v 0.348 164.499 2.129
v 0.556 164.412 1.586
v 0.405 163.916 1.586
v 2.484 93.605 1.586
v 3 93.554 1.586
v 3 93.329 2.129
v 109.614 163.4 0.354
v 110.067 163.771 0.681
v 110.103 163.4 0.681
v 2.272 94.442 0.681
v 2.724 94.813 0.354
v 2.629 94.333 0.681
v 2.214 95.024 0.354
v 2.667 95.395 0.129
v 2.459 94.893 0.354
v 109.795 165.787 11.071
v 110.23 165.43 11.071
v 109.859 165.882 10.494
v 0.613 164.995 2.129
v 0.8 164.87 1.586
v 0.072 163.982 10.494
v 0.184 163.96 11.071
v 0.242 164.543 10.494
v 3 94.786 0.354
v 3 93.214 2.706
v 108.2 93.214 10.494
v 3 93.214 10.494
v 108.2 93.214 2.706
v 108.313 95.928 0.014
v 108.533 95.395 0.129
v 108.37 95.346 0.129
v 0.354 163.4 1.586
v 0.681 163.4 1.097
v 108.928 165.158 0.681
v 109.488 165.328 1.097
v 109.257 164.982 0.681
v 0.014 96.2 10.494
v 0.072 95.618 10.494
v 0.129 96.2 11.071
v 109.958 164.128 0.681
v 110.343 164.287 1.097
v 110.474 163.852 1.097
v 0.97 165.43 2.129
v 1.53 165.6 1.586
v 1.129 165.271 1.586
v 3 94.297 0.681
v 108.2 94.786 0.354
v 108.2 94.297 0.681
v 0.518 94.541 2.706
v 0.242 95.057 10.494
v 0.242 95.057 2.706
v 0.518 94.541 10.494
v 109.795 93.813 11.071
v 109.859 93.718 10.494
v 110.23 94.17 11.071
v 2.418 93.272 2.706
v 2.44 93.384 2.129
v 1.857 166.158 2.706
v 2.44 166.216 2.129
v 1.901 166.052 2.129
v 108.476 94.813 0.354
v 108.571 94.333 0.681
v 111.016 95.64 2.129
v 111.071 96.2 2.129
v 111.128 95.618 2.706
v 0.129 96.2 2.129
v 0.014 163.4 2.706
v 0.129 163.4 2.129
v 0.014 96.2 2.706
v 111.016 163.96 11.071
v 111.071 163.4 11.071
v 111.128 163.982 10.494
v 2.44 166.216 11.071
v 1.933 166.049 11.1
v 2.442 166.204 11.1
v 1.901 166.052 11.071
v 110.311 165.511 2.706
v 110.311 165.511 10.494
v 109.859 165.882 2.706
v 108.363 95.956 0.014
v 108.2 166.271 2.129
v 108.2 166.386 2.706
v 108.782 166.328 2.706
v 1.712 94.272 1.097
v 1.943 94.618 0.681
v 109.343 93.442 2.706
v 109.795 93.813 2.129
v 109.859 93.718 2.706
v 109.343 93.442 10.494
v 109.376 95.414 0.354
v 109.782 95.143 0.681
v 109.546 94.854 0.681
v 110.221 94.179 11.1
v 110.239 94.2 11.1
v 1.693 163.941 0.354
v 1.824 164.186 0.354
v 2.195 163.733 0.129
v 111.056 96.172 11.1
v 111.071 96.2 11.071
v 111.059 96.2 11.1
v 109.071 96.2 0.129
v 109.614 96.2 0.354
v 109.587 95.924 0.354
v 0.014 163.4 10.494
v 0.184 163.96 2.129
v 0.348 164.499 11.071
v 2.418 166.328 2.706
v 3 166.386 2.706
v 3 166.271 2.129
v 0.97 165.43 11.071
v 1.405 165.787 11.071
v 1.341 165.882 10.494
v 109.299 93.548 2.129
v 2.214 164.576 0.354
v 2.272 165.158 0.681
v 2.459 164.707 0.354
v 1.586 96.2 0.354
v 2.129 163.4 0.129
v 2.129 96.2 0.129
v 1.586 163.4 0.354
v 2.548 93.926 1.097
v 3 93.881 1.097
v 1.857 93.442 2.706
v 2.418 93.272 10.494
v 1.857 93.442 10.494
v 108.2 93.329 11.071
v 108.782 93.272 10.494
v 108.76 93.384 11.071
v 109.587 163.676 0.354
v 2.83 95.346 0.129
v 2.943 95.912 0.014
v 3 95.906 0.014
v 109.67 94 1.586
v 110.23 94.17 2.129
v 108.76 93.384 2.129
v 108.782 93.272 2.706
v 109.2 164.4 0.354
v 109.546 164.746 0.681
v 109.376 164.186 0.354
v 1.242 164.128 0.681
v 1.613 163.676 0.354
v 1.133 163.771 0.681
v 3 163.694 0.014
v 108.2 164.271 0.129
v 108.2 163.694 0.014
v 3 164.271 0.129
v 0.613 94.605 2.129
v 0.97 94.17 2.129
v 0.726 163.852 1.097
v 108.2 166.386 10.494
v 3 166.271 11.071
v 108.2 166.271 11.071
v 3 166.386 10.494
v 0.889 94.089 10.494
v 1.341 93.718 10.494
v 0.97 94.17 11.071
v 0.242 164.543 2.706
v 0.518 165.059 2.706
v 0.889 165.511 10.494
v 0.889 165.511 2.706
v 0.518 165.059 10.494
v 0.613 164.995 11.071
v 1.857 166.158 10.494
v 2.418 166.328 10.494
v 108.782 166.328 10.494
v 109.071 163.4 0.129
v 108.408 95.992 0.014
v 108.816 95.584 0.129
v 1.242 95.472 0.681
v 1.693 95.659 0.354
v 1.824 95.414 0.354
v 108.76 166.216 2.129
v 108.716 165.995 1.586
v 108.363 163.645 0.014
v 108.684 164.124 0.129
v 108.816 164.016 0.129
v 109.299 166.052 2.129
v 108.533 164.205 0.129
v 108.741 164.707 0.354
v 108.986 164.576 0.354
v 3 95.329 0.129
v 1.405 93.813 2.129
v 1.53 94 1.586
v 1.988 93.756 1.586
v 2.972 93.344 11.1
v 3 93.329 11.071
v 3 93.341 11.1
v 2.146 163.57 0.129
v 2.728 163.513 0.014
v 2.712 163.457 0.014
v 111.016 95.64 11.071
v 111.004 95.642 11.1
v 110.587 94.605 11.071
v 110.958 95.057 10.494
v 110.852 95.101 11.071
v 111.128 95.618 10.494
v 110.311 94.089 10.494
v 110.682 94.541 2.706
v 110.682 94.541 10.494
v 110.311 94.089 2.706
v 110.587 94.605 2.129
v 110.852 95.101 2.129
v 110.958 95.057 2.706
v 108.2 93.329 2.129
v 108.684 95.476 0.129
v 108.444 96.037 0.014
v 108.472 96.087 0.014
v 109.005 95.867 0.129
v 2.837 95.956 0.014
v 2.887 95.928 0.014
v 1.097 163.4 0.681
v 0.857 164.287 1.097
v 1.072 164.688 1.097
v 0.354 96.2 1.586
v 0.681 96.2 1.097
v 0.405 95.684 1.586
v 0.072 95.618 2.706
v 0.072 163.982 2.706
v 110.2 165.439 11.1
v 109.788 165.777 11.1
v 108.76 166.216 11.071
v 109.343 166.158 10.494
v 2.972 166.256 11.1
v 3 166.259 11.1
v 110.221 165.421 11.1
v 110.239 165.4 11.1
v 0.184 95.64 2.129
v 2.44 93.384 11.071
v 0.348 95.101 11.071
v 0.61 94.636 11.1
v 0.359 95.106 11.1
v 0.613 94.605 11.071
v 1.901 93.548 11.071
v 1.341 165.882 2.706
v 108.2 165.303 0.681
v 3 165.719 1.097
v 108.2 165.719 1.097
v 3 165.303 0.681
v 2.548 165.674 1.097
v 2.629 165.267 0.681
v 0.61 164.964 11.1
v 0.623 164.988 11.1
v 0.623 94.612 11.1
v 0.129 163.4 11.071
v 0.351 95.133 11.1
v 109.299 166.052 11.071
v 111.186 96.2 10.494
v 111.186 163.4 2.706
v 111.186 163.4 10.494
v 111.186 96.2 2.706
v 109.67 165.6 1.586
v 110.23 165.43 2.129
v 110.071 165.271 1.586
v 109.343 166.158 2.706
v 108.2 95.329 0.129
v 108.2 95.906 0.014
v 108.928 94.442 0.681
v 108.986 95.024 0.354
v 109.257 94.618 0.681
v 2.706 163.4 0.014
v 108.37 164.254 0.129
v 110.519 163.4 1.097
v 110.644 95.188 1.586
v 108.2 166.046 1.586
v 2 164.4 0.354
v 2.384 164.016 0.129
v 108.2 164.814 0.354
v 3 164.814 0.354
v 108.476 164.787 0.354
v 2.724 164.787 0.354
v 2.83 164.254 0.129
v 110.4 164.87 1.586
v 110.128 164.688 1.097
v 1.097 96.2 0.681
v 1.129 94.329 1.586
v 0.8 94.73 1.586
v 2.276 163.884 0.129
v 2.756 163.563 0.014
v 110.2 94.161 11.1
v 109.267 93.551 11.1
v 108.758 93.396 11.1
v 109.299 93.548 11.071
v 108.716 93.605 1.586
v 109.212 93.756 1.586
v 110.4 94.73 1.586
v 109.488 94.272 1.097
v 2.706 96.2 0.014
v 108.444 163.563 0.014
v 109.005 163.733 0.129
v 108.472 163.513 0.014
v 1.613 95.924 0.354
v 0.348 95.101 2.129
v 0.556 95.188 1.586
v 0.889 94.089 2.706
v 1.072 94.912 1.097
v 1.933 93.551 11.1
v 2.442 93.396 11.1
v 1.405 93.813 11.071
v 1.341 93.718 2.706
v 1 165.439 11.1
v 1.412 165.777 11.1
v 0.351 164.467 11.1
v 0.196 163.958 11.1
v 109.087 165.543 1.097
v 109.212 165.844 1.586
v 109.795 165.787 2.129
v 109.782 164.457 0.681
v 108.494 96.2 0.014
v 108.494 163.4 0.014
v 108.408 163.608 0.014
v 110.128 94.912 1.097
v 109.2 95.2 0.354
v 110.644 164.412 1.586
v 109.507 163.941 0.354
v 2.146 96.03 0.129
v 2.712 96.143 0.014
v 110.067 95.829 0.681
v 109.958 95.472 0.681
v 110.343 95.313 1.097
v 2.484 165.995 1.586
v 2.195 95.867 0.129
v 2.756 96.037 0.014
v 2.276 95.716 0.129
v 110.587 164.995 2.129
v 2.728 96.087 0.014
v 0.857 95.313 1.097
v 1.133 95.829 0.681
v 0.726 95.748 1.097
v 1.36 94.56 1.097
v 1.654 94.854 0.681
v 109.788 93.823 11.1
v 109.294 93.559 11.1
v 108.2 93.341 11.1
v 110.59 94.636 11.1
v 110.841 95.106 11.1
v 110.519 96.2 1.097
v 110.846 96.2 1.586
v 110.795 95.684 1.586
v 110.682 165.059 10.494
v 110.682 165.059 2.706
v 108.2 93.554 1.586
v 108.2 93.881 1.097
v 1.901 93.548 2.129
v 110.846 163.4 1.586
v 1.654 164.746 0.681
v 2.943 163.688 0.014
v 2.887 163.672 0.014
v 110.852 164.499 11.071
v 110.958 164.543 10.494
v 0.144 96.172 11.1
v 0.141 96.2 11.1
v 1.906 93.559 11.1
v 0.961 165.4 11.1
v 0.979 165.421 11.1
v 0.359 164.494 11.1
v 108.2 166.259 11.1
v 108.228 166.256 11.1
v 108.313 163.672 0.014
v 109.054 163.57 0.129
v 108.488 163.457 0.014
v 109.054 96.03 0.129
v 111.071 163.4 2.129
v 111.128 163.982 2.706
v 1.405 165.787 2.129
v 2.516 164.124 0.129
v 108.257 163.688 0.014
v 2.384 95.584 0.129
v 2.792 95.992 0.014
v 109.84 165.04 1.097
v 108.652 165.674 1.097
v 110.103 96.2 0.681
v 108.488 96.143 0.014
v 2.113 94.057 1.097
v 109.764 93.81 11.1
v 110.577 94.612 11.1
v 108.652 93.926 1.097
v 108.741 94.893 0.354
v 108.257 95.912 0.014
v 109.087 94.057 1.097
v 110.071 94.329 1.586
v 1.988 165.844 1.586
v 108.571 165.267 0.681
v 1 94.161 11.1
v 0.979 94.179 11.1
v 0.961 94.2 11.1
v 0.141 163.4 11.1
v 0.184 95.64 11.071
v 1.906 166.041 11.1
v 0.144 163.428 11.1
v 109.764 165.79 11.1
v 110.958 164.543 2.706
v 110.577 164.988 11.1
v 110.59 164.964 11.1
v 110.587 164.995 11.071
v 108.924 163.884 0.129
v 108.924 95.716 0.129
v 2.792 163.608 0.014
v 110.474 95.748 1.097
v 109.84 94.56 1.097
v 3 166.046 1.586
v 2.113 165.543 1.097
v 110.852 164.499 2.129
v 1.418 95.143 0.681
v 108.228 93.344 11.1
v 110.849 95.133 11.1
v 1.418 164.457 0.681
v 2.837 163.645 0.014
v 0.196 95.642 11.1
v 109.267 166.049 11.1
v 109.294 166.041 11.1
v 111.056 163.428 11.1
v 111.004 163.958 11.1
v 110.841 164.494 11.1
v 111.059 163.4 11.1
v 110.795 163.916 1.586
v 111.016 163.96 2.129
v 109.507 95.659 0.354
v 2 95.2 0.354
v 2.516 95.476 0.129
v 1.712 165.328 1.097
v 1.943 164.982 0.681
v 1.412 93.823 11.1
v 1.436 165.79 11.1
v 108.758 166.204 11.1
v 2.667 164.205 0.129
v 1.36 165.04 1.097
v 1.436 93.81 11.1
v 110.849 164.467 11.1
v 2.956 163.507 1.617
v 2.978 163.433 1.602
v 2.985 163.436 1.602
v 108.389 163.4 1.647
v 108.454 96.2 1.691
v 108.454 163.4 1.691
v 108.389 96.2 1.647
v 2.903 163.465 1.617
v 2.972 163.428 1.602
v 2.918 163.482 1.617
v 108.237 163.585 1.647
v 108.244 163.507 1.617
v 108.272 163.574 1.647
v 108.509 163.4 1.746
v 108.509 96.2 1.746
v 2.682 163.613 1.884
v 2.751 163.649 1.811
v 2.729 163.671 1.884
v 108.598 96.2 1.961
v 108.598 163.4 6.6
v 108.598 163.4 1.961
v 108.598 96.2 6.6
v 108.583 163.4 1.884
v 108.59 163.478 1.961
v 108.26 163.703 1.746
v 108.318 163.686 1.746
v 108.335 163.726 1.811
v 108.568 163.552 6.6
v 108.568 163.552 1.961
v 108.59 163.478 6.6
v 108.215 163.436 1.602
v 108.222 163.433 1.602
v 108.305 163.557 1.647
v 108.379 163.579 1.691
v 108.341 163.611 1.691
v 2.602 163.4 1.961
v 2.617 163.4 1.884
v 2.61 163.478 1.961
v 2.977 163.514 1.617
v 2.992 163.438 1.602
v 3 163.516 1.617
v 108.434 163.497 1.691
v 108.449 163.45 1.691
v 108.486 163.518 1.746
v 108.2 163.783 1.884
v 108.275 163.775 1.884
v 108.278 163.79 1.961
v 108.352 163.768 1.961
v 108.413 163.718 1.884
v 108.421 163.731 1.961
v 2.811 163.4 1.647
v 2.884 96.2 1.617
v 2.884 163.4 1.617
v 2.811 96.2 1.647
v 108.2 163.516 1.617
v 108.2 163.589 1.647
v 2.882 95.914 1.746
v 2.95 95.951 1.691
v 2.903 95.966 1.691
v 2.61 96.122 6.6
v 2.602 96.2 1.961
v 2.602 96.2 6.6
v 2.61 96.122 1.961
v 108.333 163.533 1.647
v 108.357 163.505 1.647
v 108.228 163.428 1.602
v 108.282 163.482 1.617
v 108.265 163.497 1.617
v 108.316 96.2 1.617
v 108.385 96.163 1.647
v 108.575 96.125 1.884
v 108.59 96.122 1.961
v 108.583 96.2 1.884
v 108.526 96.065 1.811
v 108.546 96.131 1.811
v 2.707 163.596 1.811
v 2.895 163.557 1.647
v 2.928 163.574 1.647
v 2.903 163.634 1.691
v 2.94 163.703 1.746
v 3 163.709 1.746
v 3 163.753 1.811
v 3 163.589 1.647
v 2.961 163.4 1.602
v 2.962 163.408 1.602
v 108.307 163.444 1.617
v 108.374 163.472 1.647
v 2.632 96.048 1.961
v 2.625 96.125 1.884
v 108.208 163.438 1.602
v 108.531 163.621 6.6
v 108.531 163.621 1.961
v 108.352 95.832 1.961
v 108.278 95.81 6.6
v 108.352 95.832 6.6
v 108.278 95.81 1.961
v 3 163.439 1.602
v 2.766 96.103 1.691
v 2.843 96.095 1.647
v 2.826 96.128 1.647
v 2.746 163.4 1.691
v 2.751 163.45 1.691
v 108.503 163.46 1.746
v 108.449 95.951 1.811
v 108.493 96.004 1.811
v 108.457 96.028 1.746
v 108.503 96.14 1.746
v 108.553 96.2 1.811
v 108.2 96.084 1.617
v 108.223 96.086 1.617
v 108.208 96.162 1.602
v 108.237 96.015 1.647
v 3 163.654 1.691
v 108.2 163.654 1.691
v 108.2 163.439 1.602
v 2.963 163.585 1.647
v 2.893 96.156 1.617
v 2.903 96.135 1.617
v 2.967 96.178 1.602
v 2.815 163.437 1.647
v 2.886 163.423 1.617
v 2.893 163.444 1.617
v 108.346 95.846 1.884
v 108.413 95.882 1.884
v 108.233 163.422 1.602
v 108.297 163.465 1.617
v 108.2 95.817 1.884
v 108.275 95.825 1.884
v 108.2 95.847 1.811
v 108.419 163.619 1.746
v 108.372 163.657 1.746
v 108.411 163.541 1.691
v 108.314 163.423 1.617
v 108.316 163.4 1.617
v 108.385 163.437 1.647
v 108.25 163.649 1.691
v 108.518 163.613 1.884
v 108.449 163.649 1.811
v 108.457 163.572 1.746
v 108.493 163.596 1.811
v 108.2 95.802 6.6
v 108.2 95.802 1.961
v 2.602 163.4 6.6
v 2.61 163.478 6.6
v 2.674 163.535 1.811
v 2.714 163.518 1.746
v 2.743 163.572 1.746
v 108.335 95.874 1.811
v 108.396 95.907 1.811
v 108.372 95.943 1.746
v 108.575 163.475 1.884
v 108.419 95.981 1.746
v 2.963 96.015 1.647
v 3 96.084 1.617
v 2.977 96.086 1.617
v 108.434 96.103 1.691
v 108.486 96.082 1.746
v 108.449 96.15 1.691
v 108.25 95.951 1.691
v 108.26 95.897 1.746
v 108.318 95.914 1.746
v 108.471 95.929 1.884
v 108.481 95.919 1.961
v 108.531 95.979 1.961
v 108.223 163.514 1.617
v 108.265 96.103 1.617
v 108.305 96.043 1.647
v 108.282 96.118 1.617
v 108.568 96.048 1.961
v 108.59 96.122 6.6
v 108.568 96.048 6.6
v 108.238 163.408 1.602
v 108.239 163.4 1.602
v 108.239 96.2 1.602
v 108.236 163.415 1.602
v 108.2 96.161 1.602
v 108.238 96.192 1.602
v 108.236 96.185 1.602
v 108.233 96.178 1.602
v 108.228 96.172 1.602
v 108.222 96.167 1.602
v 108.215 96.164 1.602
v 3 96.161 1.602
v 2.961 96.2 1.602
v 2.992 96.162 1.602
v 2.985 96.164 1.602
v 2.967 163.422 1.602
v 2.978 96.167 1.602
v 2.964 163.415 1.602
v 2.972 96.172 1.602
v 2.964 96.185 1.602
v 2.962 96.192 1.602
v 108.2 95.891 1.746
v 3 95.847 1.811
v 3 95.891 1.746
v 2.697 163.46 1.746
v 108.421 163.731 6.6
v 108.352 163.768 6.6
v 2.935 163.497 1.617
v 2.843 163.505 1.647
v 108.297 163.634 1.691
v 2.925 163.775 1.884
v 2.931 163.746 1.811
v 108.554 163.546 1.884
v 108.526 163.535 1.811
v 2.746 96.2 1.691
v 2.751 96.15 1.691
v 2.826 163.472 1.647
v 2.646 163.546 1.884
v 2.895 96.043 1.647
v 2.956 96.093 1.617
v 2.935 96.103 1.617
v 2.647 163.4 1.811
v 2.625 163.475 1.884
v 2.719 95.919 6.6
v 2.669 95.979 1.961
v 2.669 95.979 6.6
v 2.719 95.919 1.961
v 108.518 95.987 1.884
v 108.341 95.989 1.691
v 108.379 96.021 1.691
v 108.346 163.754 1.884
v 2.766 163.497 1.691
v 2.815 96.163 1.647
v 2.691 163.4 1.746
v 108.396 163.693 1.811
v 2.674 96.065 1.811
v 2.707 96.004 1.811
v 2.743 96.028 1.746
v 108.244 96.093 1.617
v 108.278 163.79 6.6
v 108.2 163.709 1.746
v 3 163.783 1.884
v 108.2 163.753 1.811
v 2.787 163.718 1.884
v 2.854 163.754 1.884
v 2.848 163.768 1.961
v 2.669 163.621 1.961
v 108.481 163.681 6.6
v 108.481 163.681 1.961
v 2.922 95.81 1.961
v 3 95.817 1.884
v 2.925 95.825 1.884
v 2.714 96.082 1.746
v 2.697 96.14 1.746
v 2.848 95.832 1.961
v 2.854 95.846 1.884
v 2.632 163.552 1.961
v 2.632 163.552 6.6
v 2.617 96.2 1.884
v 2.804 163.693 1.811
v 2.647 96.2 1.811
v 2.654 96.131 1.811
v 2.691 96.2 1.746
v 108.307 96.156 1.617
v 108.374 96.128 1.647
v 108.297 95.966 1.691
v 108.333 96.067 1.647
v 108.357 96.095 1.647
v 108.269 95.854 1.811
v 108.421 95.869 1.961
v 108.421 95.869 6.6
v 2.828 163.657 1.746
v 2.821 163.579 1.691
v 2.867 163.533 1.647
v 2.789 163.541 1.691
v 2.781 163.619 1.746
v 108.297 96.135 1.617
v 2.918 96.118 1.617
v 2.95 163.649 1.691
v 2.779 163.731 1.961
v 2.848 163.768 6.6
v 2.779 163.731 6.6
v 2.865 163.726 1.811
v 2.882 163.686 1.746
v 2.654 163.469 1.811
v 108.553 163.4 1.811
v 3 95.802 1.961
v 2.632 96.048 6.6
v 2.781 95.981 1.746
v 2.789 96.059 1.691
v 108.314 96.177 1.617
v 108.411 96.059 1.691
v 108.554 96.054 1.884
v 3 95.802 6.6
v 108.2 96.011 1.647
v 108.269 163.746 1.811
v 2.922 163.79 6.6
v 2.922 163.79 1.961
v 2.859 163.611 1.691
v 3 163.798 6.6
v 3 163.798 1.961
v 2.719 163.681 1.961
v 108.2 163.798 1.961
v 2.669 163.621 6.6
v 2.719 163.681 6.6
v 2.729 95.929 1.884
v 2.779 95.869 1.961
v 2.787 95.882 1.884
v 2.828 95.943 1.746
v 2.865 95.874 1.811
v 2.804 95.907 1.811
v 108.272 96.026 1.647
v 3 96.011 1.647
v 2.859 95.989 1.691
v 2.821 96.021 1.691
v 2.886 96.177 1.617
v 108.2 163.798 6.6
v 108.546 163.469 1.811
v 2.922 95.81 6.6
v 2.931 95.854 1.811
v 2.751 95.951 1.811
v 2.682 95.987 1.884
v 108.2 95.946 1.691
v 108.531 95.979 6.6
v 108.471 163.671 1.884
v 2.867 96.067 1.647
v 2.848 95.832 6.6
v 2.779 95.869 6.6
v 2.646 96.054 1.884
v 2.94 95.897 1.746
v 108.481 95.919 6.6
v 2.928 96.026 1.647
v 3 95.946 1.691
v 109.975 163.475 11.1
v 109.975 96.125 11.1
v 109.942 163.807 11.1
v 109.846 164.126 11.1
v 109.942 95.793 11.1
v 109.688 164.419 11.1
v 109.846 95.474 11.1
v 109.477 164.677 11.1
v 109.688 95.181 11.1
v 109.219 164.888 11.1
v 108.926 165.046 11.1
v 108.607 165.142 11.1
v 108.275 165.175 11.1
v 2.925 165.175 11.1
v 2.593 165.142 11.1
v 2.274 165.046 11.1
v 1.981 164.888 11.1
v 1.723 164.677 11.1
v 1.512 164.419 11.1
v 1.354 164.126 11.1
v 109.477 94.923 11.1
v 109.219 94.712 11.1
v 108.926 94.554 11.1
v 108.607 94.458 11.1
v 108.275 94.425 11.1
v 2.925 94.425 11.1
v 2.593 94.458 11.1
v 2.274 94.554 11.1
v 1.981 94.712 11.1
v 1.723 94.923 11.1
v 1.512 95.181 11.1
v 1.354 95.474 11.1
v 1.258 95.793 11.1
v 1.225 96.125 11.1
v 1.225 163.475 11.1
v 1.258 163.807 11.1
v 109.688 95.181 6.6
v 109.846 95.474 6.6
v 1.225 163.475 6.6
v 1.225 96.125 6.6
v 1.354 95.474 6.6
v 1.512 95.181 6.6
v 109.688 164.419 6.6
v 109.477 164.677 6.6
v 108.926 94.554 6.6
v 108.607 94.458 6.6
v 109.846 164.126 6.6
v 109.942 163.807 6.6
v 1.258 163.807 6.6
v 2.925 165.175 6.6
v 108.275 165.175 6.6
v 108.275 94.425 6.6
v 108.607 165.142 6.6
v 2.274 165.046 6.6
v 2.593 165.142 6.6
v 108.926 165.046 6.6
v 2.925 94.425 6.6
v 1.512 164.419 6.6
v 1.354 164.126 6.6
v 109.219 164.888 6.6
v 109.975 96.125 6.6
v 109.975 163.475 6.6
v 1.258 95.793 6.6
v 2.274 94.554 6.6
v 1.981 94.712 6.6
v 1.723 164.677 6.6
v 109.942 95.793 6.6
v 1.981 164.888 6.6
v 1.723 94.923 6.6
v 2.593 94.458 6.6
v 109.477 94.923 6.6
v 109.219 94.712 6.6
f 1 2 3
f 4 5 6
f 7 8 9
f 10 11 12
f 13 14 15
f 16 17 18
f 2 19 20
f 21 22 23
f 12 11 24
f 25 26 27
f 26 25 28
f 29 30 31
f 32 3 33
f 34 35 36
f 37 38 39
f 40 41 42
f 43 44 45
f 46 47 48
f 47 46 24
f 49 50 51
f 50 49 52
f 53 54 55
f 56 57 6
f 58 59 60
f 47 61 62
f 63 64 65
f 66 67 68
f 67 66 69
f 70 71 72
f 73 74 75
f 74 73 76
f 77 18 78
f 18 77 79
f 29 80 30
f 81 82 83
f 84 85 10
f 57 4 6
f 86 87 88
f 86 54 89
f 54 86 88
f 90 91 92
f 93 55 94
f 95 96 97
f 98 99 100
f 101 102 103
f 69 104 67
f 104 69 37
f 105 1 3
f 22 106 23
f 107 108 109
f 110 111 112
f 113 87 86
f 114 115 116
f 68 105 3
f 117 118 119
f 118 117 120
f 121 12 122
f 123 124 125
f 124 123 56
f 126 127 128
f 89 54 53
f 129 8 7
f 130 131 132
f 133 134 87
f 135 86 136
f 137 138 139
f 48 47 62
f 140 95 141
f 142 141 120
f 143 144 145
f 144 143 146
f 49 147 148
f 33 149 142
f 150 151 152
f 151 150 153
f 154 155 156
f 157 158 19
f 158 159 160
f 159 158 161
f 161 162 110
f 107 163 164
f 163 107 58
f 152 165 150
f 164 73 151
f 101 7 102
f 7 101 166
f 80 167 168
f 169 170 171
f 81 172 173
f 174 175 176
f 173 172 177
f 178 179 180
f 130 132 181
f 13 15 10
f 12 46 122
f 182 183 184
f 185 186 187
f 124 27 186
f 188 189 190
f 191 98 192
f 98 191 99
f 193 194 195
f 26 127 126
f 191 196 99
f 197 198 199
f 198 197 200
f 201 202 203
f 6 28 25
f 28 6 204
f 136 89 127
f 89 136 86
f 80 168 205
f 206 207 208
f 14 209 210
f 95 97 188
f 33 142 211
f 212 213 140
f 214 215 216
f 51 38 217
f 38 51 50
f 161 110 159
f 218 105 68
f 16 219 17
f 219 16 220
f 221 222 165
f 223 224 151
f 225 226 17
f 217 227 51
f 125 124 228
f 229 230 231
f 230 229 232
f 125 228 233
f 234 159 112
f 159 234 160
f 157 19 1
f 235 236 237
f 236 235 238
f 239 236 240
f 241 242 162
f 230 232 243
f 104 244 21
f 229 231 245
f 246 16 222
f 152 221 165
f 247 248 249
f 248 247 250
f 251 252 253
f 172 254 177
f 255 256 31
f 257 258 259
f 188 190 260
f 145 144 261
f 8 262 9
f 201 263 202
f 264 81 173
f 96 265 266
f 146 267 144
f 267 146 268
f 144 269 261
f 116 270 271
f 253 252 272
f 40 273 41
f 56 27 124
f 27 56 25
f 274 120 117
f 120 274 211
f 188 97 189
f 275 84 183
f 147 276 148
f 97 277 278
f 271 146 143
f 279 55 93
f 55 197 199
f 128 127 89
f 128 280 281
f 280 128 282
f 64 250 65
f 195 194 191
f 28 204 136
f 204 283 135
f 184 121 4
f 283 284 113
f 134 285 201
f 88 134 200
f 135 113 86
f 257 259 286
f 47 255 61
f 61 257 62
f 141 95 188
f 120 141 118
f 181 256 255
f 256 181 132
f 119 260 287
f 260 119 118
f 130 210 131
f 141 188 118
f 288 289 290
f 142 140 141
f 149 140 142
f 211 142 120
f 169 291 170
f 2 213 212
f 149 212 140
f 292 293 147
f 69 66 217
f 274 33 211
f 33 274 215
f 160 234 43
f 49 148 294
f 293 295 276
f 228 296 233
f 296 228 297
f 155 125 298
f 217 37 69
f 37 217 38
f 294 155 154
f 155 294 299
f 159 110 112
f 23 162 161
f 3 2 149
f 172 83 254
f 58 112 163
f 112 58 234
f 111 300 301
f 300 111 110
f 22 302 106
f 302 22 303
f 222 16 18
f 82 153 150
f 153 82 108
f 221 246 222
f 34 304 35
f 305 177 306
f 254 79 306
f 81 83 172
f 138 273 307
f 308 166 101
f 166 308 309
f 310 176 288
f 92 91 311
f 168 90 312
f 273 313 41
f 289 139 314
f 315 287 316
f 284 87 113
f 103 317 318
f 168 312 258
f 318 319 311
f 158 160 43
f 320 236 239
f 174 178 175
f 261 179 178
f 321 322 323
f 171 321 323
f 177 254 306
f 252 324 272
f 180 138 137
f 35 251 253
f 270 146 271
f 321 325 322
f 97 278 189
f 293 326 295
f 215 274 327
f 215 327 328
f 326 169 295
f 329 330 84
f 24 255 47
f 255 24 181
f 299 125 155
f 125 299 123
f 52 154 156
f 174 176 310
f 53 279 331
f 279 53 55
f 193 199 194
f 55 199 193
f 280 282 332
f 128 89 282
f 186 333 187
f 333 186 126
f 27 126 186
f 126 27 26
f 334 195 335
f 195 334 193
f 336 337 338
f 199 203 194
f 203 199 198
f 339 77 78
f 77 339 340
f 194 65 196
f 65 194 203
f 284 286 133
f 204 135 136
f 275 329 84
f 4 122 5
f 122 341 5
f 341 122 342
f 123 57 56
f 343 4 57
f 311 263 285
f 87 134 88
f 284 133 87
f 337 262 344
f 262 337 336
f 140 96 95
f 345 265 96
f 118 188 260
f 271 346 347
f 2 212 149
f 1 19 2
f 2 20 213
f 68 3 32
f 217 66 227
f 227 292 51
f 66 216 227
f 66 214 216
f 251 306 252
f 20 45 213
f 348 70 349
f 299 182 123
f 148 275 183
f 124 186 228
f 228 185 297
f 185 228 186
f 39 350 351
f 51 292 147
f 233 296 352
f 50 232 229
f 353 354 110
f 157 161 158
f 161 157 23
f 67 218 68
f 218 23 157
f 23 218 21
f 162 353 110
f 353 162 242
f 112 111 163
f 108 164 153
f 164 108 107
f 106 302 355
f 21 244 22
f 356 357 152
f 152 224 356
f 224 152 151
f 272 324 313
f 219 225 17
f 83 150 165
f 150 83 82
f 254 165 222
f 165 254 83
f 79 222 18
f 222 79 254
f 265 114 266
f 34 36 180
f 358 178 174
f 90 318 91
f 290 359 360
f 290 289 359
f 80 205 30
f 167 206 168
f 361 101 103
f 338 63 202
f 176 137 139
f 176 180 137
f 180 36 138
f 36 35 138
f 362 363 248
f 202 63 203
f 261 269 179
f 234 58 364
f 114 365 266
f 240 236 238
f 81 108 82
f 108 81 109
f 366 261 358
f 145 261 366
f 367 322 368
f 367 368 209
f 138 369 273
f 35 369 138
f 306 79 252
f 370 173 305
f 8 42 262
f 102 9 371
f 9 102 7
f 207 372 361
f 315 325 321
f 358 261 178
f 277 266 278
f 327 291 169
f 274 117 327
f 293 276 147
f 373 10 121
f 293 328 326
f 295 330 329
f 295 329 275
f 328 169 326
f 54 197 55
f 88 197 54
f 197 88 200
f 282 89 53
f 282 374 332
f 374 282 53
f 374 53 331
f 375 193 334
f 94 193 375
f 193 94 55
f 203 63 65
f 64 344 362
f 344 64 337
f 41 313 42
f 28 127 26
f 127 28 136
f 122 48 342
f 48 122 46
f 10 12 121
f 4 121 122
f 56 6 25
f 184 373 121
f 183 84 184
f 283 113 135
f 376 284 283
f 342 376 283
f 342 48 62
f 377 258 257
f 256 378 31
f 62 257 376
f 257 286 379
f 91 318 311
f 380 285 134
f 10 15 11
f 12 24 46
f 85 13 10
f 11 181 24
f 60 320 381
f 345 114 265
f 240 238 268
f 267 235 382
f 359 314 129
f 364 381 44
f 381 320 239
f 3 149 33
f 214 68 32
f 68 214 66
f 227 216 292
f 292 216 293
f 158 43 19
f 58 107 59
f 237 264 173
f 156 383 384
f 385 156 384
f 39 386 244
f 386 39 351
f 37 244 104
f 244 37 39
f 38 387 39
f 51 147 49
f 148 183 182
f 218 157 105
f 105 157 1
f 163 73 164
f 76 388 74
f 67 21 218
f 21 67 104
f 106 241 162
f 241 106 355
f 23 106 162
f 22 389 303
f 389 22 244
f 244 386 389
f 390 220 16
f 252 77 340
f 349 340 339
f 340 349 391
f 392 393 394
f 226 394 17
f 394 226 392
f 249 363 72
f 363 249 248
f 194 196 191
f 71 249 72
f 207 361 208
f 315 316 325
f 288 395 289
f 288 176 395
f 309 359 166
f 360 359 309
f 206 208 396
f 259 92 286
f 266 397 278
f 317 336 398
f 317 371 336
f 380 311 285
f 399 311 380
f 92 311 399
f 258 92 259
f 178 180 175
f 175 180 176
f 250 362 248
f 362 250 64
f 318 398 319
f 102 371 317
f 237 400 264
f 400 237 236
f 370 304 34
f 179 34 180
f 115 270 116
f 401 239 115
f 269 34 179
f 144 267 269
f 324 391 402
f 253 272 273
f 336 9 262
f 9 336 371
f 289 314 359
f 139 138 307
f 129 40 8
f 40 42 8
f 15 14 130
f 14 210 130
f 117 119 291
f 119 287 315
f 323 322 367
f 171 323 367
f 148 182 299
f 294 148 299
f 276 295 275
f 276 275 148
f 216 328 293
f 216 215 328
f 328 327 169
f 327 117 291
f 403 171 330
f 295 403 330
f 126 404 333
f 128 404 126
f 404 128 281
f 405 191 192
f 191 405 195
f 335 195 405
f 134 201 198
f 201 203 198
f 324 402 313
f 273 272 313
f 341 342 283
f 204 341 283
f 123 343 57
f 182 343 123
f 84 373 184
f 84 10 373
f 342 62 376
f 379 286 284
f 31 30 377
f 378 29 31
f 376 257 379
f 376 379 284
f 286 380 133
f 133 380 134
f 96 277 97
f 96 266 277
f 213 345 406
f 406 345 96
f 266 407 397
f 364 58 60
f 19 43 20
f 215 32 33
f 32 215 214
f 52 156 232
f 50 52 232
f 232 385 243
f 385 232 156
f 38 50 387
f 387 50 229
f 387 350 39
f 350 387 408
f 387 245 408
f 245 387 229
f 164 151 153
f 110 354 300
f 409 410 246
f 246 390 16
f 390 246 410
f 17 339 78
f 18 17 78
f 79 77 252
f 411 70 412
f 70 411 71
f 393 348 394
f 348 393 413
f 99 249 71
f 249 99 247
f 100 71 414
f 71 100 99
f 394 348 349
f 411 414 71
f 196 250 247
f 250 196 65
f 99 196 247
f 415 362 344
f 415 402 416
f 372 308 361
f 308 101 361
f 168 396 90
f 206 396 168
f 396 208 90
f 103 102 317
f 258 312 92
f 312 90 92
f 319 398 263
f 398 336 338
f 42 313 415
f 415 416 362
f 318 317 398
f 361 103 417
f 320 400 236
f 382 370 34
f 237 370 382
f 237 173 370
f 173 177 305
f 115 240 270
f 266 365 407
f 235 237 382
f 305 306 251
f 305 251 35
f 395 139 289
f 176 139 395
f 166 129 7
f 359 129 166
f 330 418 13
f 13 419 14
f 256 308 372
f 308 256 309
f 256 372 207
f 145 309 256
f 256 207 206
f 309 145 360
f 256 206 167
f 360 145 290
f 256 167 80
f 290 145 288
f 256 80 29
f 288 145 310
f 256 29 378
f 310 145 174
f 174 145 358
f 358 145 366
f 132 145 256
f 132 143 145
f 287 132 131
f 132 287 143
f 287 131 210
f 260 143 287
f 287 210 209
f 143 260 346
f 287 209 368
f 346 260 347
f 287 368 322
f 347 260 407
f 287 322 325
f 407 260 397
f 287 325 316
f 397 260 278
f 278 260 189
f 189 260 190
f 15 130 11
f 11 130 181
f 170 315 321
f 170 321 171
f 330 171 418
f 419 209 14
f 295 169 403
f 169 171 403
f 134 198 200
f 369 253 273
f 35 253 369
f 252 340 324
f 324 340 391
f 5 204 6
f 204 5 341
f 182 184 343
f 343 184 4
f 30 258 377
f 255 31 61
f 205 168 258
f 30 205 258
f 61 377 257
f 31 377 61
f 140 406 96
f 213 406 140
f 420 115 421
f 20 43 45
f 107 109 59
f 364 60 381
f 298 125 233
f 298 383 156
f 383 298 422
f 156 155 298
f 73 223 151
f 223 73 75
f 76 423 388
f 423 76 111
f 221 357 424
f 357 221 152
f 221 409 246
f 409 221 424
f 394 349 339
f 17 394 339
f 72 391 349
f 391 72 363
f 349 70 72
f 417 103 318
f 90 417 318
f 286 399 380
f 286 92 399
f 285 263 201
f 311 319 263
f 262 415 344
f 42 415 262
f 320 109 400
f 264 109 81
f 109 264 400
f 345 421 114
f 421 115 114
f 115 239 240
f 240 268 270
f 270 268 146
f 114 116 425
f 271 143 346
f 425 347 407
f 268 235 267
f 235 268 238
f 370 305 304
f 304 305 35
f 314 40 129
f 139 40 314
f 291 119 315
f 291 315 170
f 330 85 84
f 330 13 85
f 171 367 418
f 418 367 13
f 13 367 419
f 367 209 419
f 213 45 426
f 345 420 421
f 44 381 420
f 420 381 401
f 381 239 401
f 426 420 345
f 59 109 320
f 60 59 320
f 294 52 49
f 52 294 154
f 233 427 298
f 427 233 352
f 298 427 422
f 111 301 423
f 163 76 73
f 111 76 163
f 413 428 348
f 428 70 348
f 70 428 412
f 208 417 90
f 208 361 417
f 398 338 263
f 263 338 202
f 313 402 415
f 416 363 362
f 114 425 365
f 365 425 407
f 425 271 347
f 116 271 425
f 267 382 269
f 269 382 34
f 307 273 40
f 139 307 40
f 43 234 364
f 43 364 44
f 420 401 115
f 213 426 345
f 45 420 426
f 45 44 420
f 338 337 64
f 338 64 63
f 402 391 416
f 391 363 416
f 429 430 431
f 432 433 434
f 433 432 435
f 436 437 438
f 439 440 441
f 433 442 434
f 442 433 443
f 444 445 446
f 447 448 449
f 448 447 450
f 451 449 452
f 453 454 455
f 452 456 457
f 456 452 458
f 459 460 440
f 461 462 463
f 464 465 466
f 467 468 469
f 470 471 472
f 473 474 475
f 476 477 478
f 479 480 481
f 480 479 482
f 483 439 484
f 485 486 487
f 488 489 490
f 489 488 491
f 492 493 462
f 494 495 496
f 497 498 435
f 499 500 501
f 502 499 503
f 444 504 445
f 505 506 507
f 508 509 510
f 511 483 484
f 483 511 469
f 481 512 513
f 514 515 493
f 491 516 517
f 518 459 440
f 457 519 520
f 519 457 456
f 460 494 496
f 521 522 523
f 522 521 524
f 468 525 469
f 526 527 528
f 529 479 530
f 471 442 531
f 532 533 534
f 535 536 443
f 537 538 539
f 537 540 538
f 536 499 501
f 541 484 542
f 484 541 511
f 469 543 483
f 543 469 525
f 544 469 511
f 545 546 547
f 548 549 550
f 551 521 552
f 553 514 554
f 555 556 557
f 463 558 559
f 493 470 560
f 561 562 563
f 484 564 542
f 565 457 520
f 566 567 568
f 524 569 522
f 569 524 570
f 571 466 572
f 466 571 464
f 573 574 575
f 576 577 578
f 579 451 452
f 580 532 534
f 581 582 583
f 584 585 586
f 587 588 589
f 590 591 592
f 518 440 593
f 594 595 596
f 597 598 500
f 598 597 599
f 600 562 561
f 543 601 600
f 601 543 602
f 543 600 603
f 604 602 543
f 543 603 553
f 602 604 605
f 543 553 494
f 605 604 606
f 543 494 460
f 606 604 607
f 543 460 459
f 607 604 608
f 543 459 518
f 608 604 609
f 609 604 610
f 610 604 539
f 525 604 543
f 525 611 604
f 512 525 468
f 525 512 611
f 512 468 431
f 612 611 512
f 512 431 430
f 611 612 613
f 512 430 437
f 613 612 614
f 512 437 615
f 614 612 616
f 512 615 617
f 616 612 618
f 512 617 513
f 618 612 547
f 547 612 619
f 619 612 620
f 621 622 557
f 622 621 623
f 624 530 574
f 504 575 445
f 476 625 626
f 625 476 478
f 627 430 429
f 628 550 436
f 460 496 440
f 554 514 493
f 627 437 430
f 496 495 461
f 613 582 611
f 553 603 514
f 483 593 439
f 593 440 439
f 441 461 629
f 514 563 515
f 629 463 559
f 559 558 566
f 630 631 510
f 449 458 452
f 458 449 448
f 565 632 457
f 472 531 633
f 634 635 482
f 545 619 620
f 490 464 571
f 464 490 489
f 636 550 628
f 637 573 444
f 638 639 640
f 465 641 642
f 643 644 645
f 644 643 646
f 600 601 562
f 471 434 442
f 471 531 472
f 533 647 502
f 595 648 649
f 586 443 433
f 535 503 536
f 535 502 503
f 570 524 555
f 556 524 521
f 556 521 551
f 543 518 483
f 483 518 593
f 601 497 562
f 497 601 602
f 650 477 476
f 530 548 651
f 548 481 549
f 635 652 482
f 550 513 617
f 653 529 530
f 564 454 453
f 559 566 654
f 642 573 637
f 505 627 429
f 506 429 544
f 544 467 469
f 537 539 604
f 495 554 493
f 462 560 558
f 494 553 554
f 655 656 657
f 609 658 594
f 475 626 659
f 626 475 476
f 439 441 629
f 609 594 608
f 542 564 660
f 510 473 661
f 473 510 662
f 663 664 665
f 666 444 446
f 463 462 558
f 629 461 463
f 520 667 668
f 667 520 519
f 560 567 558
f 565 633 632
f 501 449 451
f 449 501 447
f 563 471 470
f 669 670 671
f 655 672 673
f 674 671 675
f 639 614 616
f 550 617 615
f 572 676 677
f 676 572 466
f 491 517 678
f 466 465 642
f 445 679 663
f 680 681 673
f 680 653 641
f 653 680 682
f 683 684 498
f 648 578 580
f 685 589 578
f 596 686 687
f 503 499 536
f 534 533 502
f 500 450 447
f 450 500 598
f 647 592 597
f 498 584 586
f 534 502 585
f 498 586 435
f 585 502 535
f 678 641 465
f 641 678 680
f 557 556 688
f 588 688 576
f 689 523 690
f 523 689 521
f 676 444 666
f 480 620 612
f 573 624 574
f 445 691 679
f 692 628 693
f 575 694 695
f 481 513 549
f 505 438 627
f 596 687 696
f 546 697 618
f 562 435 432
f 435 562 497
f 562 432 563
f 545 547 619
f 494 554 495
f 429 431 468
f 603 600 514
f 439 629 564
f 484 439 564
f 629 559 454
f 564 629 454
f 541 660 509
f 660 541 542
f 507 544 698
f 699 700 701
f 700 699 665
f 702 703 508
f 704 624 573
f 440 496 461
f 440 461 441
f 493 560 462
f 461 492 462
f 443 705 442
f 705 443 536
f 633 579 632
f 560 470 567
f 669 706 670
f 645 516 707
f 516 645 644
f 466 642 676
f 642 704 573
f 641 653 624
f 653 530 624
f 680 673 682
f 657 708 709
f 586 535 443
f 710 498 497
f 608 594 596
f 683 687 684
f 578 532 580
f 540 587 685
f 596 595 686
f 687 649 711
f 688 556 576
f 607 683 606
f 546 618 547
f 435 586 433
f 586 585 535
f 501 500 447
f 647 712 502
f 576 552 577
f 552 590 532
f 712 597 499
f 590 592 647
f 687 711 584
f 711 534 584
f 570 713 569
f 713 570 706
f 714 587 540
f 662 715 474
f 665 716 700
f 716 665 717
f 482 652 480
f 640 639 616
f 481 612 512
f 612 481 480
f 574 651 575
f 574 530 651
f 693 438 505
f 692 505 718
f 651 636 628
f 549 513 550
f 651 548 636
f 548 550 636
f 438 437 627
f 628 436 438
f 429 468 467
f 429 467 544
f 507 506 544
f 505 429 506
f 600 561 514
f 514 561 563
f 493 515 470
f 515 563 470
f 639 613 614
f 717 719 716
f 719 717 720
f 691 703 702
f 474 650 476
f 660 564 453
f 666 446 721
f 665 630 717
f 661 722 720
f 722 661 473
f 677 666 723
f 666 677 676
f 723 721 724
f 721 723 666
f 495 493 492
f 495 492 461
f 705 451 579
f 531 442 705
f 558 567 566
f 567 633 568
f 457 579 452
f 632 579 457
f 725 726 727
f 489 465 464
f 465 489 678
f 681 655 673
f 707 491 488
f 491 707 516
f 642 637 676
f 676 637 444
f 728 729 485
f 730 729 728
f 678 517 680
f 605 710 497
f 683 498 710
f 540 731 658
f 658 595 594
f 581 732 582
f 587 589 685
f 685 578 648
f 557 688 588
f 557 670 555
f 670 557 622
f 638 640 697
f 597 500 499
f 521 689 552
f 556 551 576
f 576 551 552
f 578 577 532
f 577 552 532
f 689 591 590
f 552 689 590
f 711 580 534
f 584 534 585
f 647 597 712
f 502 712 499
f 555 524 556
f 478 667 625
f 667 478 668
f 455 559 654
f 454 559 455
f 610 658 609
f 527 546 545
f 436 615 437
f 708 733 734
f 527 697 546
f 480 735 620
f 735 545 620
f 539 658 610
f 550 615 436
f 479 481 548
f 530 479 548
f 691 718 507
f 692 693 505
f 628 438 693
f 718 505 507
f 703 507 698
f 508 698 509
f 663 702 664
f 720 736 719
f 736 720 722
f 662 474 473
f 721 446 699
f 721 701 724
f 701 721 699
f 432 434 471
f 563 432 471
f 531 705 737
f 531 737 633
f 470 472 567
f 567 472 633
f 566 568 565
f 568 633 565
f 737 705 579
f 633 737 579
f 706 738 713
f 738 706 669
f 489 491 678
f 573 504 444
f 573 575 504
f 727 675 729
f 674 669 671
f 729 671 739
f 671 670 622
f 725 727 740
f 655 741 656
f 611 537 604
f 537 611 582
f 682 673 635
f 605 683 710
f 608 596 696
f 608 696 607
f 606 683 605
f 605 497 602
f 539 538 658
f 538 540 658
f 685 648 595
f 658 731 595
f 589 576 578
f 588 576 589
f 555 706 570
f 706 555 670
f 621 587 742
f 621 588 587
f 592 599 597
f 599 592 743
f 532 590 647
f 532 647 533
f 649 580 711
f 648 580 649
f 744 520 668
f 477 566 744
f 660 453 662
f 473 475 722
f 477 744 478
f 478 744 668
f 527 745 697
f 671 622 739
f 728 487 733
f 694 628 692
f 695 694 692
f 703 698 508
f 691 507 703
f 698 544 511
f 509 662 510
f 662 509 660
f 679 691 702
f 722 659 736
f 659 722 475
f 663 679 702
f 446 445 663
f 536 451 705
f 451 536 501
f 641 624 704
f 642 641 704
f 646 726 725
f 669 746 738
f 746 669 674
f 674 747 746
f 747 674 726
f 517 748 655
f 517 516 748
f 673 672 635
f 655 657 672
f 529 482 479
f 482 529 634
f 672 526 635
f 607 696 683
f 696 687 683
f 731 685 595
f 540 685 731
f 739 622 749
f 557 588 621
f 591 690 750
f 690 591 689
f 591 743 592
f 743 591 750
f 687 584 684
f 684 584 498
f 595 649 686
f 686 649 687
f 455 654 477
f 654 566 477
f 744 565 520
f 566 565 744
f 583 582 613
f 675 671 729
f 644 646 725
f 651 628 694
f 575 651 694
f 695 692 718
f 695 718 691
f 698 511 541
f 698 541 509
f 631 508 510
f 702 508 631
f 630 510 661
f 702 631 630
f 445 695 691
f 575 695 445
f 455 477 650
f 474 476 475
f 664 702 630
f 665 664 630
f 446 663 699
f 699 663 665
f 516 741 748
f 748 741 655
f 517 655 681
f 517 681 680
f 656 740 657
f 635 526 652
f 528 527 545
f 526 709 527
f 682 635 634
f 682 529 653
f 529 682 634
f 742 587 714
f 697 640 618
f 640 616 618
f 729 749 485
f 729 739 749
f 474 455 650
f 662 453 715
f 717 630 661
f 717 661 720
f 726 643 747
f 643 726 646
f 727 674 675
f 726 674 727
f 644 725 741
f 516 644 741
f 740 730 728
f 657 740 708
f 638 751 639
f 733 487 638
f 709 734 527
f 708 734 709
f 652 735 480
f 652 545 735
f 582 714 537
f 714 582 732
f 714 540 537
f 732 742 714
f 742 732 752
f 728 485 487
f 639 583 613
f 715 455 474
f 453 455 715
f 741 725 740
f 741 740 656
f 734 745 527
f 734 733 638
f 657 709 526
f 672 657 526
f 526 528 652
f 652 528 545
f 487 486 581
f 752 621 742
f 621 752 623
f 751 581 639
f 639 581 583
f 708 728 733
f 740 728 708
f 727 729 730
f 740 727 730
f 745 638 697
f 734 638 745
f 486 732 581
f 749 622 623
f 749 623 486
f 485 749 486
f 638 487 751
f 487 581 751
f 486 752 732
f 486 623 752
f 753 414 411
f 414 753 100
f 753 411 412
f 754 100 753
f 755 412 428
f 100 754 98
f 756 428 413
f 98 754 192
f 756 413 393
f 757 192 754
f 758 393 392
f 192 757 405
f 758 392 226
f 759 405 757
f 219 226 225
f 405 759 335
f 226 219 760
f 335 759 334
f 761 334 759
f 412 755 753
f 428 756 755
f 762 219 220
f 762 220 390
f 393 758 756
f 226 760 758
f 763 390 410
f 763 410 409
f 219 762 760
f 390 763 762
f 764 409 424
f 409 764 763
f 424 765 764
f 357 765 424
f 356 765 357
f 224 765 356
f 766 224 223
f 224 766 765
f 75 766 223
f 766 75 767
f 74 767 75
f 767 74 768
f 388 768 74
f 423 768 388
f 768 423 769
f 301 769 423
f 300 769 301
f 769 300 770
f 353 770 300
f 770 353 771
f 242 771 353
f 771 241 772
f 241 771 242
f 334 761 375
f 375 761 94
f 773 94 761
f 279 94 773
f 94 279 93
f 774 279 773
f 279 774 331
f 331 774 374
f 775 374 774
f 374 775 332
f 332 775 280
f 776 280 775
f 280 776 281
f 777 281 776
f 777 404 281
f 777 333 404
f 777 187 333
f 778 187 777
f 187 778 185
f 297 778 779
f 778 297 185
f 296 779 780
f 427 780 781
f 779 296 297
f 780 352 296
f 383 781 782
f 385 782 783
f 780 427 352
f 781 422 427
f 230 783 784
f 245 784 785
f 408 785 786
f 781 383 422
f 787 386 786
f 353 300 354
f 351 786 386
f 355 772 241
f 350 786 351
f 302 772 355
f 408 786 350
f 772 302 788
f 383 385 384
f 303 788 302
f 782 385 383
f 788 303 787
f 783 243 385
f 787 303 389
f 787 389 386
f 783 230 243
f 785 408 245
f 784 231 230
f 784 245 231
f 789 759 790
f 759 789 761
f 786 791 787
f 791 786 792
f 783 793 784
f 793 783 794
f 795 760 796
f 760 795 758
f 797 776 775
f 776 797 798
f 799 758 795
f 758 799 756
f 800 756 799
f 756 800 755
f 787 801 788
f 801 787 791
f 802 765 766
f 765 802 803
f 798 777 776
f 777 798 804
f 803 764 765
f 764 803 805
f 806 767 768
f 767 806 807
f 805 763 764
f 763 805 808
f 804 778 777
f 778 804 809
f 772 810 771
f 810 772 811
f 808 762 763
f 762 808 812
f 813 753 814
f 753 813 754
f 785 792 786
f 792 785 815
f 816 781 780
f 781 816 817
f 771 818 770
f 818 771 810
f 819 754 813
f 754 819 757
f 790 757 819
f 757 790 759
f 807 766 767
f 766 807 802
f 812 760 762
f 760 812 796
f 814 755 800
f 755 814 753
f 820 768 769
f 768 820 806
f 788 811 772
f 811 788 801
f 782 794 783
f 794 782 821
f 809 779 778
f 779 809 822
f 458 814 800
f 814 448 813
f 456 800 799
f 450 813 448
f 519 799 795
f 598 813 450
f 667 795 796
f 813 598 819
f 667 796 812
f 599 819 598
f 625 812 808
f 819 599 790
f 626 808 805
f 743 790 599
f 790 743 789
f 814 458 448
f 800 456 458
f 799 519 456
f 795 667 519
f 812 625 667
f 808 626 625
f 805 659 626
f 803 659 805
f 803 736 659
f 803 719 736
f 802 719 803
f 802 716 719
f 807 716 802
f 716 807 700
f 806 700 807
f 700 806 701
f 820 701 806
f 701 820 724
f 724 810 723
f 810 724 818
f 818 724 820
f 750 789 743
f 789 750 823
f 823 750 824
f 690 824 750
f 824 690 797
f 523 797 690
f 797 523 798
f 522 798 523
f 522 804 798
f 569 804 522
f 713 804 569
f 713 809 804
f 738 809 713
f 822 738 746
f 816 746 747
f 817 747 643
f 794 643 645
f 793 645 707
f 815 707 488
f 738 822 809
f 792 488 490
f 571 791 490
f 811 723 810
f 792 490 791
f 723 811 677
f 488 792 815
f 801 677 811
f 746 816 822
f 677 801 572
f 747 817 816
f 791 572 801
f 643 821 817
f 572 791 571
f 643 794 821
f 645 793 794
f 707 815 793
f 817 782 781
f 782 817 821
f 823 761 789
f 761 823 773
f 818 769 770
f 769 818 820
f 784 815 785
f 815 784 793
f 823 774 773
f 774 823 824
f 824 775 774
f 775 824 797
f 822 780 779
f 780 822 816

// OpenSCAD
//-----------------------------------------------------------------------
// Yet Another Parameterized Projectbox generator
//
//  This is a box for <template>
//
//  Version 3.0 (01-12-2023)
//
// This design is parameterized based on the size of a PCB.
//
//  for many or complex cutouts you might need to adjust
//  the number of elements:
//
//      Preferences->Advanced->Turn of rendering at 250000 elements
//                                                  ^^^^^^
//
//-----------------------------------------------------------------------

include <../YAPPgenerator_v3.scad>

//-- which part(s) do you want to print?
printBaseShell        = false;
printLidShell         = true;
printSwitchExtenders  = true;
printDisplayClips     = false;
shiftLid              = 10;  // Set the distance between the lid and base when rendered or previewed side by side
                            
//-- padding between pcb and inside wall
paddingFront        = 1;
paddingBack         = 1;
paddingRight        = 1;
paddingLeft         = 1;

// ********************************************************************
// The Following will be used as the first element in the pbc array

//Defined here so you can define the "Main" PCB using these if wanted
pcbLength           = 104; // front to back (X axis)
pcbWidth            = 66; // side to side (Y axis)
pcbThickness        = 1.6;
standoffHeight      = 1.0;  //-- How much the PCB needs to be raised from the base to leave room for solderings 
standoffDiameter    = 7;
standoffPinDiameter = 2.4;
standoffHoleSlack   = 0.4;

wallThickness       = 2.6;
basePlaneThickness  = 1.6;
lidPlaneThickness   = 1.6;

//-- Total height of box = lidPlaneThickness 
//                       + lidWallHeight 
//--                     + baseWallHeight 
//                       + basePlaneThickness
//-- space between pcb and lidPlane :=
//--      (bottonWallHeight+lidWallHeight) - (standoffHeight+pcbThickness)
baseWallHeight      = 10;
lidWallHeight       = 5;

//-- ridge where base and lid off box can overlap
//-- Make sure this isn't less than lidWallHeight
ridgeHeight         = 5.0;
ridgeSlack          = 0.3;
roundRadius         = 3.0;

// Box Types are 0-5 with 0 as the default
// 0 = All edges rounded with radius (roundRadius) above
// 1 = All edges square
// 2 = All edges chamfered by (roundRadius) above 
// 3 = Square top and bottom edges (the ones that touch the build plate) and rounded vertical edges
// 4 = Square top and bottom edges (the ones that touch the build plate) and chamfered vertical edges
// 5 = Chamfered top and bottom edges (the ones that touch the build plate) and rounded vertical edges
boxType = 3; // Default type 0


//---------------------------
//--     C O N T R O L     --
//---------------------------
// -- Render --
renderQuality             = 8;          //-> from 1 to 32, Default = 8

// --Preview --
previewQuality            = 5;          //-> from 1 to 32, Default = 5
showSideBySide            = true;       //-> Default = true
onLidGap                  = 0;  // tip don't override to animate the lid opening
//onLidGap                  = ((ridgeHeight) - (ridgeHeight * abs(($t-0.5)*2)))*2;  // tip don't override to animate the lid opening/closing
colorLid                  = "YellowGreen";   
alphaLid                  = 1;
colorBase                 = "BurlyWood";
alphaBase                 = 1;
hideLidWalls              = false;      //-> Remove the walls from the lid : only if preview and showSideBySide=true 
hideBaseWalls             = false;      //-> Remove the walls from the base : only if preview and showSideBySide=true  
showOrientation           = true;       //-> Show the Front/Back/Left/Right labels : only in preview
showPCB                   = false;      //-> Show the PCB in red : only in preview 
showSwitches              = false;      //-> Show the switches (for pushbuttons) : only in preview 
showButtonsDepressed      = false;      //-> Should the buttons in the Lid On view be in the pressed position
showOriginCoordBox        = false;      //-> Shows red bars representing the origin for yappCoordBox : only in preview 
showOriginCoordBoxInside  = false;      //-> Shows blue bars representing the origin for yappCoordBoxInside : only in preview 
showOriginCoordPCB        = false;      //-> Shows blue bars representing the origin for yappCoordBoxInside : only in preview 
showMarkersPCB            = false;      //-> Shows black bars corners of the PCB : only in preview 
showMarkersCenter         = false;      //-> Shows magenta bars along the centers of all faces  
inspectX                  = 0;          //-> 0=none (>0 from Back)
inspectY                  = 0;          //-> 0=none (>0 from Right)
inspectZ                  = 0;          //-> 0=none (>0 from Bottom)
inspectXfromBack          = true;       //-> View from the inspection cut foreward
inspectYfromLeft          = true;       //-> View from the inspection cut to the right
inspectZfromBottom        = true;       //-> View from the inspection cut up
//---------------------------
//--     C O N T R O L     --
//---------------------------


//===================================================================
//  *** Display Mounts ***
//    add a cutout to the lid with mounting posts for a display
//-------------------------------------------------------------------
//  Default origin = yappCoordBox: box[0,0,0]
//
//  Parameters:
//   Required:
//    p(0) = posx
//    p(1) = posy
//    p[2] : displayWidth = overall Width of the display module
//    p[3] : displayHeight = overall Height of the display module
//    p[4] : pinInsetH = Horizontal inset of the mounting hole
//    p[5] : pinInsetV = Vertical inset of the mounting hole
//    p[6] : pinDiameter,
//    p[7] : postOverhang  = Extra distance on outside of pins for the display to sit on - pin Diameter is a good value
//    p[8] : walltoPCBGap = Distance from the display PCB to the surface of the screen
//    p[9] : pcbThickness  = Thickness of the display module PCB
//    p[10] : windowWidth = opening width for the screen
//    p[11] : windowHeight = Opening height for the screen
//    p[12] : windowOffsetH = Horizontal offset from the center for the opening
//    p[13] : windowOffsetV = Vertical offset from the center for the opening
//    p[14] : bevel = Apply a 45degree bevel to the opening
// Optionl:
//    p[15] : rotation
//    p[16] : snapDiameter : default = pinDiameter*2
//    p[17] : lidThickness : default = lidPlaneThickness
//    n(a) = { <yappOrigin>, yappCenter } 
//    n(b) = { <yappCoordBox> | yappCoordPCB | yappCoordBoxInside }
//    n(c) = { <yappGlobalOrigin>, yappAltOrigin } // Only affects Top(lid), Back and Right Faces
//    n(d) = [yappPCBName, "XXX"] : Specify a PCB. Defaults to [yappPCBName, "Main"]
//-------------------------------------------------------------------
displayMounts =
[
  /*
  [ // This is for a SSD-1306 OLED Display v1.1 with vcc-gnd-scl-sda Pinout
    20, //xPos
    20, // yPos
    28.9, // displayWidth
    27.1, //displayHeight
    2.7, //pinInsetH
    1.9, //pinInsetV
    2.0, //pinDiameter
    2.0, //postOverhang
    1.5, //walltoPCBGap
    1.5, //pcbThickness
    26.4, //windowWidth
    14.5, //windowHeight
    0, //windowOffsetH
    1.5, //windowOffsetV
    true, //bevel
    0, // rotation
    yappDefault,//snapDiameter
    yappDefault,
    yappCenter,  
  ],  
  [ // This is for a 1620A 2x20 LCD Display - Mounted through the lid
    100, //xPos
    25, // yPos
    80, // displayWidth
    35.9, //displayHeight
    2.2, //pinInsetH
    2.2, //pinInsetV
    2.7, //pinDiameter
    2.7, //postOverhang
    5.8, //walltoPCBGap
    1.5, //pcbThickness
    71.5, //windowWidth
    24.2, //windowHeight
    0, //windowOffsetH
    -0.9, //windowOffsetV
    false, //bevel
    0, // rotation
    5.0,//snapDiameter
    yappDefault,
    yappCenter,  
  ],
  [ // This is for a 1620A 2x20 LCD Display - Mounted under the lid
    100, //xPos
    75, // yPos
    80, // displayWidth
    35.9, //displayHeight
    2.2, //pinInsetH
    2.2, //pinInsetV
    2.7, //pinDiameter
    2.7, //postOverhang
    7.3, //walltoPCBGap
    1.5, //pcbThickness
    67.0, //windowWidth
    17.0, //windowHeight
    0, //windowOffsetH
    -0.9, //windowOffsetV
    true, //bevel
    0, // rotation
    5.0,//snapDiameter
    yappDefault,
    yappCenter,  
  ],
  */
  [ // This is for a 2004A 4x20 LCD Display - Mounted under the lid
    55.5, //xPos
    36.5, // yPos
    98.0, // displayWidth
    60.0, //displayHeight
    2.2, //pinInsetH
    2.5, //pinInsetV
    3.3, //pinDiameter
    3.3, //postOverhang
    9.3, //walltoPCBGap
    1.6, //pcbThickness
    79.0, //windowWidth
    28.0, //windowHeight
    0, //windowOffsetH
    0.0, //windowOffsetV
    true, //bevel
    0, // rotation
    5.0,//snapDiameter
    yappDefault,
    yappCenter,  
  ],
  /*
  [ // This is for a 2.8 TFT SPI 240*320 V1.2 Display
    //  Note the measurements were to the pin holes not the entire display 
    30, //xPos
    80, // yPos
    82.4, // displayWidth
    50.0, //displayHeight
    3.0, //pinInsetH
    3.0, //pinInsetV
    2.9, //pinDiameter
    2.9, //postOverhang
    3.8, //walltoPCBGap
    1.5, //pcbThickness
    60.0, //windowWidth
    46.6, //windowHeight
    5.4, //windowOffsetH
    0, //windowOffsetV
    true, //bevel
    90, // rotation
    5.0,//snapDiameter
    yappDefault,
    yappCenter,  
  ],
  */
];

//---- This is where the magic happens ----
YAPPgenerate();
